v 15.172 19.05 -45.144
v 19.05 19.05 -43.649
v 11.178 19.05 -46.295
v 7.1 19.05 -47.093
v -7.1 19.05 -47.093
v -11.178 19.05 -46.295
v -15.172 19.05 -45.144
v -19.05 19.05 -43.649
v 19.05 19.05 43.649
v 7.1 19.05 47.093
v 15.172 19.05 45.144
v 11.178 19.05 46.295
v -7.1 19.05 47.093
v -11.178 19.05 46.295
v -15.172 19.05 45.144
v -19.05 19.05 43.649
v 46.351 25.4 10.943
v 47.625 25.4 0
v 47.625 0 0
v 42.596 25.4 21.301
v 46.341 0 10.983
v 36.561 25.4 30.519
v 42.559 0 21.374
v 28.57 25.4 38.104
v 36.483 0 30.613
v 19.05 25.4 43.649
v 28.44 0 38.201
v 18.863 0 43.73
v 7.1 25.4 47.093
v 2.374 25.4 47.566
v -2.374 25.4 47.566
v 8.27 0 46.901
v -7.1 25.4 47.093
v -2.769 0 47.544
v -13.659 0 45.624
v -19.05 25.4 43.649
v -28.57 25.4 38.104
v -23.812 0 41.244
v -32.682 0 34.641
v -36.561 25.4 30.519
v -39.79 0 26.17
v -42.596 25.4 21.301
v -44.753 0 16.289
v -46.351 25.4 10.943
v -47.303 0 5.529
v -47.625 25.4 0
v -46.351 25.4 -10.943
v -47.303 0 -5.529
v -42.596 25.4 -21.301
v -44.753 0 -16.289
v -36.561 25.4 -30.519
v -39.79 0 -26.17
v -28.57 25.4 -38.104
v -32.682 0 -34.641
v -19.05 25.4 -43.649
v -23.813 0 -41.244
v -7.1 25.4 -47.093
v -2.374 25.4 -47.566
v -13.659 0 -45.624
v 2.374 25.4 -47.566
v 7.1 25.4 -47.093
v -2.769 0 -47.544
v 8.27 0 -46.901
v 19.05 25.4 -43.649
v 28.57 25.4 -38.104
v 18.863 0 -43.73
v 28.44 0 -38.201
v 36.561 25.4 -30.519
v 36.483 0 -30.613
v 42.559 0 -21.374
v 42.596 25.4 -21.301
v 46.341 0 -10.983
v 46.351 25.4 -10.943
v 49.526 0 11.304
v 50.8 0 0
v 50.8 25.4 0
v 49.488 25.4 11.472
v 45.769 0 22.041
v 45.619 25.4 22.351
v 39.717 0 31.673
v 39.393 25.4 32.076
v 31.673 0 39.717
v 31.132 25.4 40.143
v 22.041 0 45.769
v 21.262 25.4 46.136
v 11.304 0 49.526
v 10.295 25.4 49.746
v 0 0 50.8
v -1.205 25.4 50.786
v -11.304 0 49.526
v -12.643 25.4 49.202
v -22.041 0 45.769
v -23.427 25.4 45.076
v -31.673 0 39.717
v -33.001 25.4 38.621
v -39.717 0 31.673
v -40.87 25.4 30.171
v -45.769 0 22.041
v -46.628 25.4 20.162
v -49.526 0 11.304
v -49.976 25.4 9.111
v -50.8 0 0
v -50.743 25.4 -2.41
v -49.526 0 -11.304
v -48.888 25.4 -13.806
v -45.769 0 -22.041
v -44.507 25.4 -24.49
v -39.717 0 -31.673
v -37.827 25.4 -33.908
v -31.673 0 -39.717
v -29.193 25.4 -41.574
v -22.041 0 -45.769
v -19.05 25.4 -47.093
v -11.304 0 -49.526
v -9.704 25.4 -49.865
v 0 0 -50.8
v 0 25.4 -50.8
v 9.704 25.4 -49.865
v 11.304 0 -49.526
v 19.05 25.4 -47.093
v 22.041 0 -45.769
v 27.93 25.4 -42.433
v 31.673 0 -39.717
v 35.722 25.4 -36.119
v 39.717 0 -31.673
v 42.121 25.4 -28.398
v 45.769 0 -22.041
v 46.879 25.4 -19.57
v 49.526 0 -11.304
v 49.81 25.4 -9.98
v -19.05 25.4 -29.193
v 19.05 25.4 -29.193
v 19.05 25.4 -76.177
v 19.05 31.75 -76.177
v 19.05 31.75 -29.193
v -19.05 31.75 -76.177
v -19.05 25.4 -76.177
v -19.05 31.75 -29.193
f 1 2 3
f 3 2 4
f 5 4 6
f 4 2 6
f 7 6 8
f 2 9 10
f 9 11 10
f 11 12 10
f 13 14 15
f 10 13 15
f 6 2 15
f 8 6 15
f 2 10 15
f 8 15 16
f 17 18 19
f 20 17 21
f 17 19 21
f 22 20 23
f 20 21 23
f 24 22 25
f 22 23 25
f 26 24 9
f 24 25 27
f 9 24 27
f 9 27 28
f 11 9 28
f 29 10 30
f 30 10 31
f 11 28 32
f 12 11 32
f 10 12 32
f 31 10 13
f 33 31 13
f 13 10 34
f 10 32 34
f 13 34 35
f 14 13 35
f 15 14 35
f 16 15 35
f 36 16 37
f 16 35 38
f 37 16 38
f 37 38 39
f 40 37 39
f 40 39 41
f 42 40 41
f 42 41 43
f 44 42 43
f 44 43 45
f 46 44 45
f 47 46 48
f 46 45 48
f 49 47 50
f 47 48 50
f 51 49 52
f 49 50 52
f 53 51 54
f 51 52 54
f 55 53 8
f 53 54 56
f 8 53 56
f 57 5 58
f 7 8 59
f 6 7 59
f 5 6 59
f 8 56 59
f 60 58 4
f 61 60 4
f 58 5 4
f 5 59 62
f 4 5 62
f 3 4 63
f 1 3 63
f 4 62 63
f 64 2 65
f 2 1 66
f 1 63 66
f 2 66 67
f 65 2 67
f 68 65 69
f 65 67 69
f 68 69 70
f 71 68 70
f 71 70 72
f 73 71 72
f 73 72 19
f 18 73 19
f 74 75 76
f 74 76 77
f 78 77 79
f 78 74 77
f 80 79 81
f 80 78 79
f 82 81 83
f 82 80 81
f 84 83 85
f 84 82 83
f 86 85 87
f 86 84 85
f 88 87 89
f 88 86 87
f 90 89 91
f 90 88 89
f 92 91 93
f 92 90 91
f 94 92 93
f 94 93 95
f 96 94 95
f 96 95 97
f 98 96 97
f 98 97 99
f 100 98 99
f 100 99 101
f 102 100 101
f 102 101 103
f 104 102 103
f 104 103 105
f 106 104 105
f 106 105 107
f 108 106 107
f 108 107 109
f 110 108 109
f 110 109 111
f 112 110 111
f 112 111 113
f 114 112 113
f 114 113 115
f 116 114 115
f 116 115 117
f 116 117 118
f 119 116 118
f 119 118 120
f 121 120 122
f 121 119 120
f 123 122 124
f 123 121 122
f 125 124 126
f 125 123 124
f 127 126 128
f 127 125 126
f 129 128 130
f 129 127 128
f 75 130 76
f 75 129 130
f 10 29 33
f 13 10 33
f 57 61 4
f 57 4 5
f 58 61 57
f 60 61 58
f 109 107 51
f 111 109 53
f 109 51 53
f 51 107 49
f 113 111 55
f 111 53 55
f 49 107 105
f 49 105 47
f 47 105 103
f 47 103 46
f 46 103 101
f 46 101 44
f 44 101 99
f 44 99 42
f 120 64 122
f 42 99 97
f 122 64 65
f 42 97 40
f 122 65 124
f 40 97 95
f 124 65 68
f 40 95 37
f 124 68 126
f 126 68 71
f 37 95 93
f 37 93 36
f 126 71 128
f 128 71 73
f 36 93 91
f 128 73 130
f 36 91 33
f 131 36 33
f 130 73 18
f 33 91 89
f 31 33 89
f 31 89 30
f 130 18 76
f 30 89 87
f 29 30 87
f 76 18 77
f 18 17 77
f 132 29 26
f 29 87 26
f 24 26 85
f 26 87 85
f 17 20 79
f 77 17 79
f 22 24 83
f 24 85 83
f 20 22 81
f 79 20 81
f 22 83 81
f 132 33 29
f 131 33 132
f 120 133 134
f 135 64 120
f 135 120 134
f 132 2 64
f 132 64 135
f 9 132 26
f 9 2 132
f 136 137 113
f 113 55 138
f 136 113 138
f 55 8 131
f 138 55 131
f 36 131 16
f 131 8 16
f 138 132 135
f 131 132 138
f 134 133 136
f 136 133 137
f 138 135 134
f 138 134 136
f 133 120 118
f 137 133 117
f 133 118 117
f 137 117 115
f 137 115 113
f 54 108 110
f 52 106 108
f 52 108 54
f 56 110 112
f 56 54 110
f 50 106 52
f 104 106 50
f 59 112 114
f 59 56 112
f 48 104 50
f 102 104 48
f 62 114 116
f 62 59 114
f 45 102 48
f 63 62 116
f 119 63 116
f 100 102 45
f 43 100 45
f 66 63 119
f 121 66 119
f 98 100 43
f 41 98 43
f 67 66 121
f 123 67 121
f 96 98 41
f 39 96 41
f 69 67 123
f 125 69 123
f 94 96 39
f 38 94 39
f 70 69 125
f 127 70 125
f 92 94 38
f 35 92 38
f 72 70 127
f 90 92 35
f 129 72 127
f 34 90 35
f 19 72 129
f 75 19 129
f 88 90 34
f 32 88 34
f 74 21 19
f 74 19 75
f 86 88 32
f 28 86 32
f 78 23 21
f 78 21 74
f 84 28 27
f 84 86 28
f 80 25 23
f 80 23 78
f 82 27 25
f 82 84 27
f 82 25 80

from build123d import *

# Parameters (mm, degrees)
F0_R     = 50.8
F1_DEPTH = 25.4
F2_R     = 47.625
F3_DEPTH = 25.4
F4_W     = 38.1
F4_H     = 94.18572
F5_DEPTH = 6.35
F6_W     = 38.1
F6_H     = 46.983762
F7_DEPTH = 6.35


with BuildPart() as f1:
    # F0 (on Front) → F1 (new body)
    with BuildSketch(Plane.XZ):
        Circle(F0_R)
    extrude(amount=-F1_DEPTH)

    # F2 (on face) → F3 (cut)
    with BuildSketch(Plane.XZ):
        Circle(F2_R)
    extrude(amount=-F3_DEPTH, mode=Mode.SUBTRACT)

    # F4 (on face) → F5 (join)
    with BuildSketch(Plane(origin=(0, 25.4, 0), x_dir=(-1, 0, 0), z_dir=(0, 1, 0))):
        Rectangle(F4_W, F4_H)
    extrude(amount=-F5_DEPTH)

    # F6 (on face) → F7 (join)
    with BuildSketch(Plane(origin=(0, 25.4, 0), x_dir=(-1, 0, 0), z_dir=(0, 1, 0))):
        with Locations((0, -52.684718)):
            Rectangle(F6_W, F6_H)
    extrude(amount=F7_DEPTH)


solid = f1.part
